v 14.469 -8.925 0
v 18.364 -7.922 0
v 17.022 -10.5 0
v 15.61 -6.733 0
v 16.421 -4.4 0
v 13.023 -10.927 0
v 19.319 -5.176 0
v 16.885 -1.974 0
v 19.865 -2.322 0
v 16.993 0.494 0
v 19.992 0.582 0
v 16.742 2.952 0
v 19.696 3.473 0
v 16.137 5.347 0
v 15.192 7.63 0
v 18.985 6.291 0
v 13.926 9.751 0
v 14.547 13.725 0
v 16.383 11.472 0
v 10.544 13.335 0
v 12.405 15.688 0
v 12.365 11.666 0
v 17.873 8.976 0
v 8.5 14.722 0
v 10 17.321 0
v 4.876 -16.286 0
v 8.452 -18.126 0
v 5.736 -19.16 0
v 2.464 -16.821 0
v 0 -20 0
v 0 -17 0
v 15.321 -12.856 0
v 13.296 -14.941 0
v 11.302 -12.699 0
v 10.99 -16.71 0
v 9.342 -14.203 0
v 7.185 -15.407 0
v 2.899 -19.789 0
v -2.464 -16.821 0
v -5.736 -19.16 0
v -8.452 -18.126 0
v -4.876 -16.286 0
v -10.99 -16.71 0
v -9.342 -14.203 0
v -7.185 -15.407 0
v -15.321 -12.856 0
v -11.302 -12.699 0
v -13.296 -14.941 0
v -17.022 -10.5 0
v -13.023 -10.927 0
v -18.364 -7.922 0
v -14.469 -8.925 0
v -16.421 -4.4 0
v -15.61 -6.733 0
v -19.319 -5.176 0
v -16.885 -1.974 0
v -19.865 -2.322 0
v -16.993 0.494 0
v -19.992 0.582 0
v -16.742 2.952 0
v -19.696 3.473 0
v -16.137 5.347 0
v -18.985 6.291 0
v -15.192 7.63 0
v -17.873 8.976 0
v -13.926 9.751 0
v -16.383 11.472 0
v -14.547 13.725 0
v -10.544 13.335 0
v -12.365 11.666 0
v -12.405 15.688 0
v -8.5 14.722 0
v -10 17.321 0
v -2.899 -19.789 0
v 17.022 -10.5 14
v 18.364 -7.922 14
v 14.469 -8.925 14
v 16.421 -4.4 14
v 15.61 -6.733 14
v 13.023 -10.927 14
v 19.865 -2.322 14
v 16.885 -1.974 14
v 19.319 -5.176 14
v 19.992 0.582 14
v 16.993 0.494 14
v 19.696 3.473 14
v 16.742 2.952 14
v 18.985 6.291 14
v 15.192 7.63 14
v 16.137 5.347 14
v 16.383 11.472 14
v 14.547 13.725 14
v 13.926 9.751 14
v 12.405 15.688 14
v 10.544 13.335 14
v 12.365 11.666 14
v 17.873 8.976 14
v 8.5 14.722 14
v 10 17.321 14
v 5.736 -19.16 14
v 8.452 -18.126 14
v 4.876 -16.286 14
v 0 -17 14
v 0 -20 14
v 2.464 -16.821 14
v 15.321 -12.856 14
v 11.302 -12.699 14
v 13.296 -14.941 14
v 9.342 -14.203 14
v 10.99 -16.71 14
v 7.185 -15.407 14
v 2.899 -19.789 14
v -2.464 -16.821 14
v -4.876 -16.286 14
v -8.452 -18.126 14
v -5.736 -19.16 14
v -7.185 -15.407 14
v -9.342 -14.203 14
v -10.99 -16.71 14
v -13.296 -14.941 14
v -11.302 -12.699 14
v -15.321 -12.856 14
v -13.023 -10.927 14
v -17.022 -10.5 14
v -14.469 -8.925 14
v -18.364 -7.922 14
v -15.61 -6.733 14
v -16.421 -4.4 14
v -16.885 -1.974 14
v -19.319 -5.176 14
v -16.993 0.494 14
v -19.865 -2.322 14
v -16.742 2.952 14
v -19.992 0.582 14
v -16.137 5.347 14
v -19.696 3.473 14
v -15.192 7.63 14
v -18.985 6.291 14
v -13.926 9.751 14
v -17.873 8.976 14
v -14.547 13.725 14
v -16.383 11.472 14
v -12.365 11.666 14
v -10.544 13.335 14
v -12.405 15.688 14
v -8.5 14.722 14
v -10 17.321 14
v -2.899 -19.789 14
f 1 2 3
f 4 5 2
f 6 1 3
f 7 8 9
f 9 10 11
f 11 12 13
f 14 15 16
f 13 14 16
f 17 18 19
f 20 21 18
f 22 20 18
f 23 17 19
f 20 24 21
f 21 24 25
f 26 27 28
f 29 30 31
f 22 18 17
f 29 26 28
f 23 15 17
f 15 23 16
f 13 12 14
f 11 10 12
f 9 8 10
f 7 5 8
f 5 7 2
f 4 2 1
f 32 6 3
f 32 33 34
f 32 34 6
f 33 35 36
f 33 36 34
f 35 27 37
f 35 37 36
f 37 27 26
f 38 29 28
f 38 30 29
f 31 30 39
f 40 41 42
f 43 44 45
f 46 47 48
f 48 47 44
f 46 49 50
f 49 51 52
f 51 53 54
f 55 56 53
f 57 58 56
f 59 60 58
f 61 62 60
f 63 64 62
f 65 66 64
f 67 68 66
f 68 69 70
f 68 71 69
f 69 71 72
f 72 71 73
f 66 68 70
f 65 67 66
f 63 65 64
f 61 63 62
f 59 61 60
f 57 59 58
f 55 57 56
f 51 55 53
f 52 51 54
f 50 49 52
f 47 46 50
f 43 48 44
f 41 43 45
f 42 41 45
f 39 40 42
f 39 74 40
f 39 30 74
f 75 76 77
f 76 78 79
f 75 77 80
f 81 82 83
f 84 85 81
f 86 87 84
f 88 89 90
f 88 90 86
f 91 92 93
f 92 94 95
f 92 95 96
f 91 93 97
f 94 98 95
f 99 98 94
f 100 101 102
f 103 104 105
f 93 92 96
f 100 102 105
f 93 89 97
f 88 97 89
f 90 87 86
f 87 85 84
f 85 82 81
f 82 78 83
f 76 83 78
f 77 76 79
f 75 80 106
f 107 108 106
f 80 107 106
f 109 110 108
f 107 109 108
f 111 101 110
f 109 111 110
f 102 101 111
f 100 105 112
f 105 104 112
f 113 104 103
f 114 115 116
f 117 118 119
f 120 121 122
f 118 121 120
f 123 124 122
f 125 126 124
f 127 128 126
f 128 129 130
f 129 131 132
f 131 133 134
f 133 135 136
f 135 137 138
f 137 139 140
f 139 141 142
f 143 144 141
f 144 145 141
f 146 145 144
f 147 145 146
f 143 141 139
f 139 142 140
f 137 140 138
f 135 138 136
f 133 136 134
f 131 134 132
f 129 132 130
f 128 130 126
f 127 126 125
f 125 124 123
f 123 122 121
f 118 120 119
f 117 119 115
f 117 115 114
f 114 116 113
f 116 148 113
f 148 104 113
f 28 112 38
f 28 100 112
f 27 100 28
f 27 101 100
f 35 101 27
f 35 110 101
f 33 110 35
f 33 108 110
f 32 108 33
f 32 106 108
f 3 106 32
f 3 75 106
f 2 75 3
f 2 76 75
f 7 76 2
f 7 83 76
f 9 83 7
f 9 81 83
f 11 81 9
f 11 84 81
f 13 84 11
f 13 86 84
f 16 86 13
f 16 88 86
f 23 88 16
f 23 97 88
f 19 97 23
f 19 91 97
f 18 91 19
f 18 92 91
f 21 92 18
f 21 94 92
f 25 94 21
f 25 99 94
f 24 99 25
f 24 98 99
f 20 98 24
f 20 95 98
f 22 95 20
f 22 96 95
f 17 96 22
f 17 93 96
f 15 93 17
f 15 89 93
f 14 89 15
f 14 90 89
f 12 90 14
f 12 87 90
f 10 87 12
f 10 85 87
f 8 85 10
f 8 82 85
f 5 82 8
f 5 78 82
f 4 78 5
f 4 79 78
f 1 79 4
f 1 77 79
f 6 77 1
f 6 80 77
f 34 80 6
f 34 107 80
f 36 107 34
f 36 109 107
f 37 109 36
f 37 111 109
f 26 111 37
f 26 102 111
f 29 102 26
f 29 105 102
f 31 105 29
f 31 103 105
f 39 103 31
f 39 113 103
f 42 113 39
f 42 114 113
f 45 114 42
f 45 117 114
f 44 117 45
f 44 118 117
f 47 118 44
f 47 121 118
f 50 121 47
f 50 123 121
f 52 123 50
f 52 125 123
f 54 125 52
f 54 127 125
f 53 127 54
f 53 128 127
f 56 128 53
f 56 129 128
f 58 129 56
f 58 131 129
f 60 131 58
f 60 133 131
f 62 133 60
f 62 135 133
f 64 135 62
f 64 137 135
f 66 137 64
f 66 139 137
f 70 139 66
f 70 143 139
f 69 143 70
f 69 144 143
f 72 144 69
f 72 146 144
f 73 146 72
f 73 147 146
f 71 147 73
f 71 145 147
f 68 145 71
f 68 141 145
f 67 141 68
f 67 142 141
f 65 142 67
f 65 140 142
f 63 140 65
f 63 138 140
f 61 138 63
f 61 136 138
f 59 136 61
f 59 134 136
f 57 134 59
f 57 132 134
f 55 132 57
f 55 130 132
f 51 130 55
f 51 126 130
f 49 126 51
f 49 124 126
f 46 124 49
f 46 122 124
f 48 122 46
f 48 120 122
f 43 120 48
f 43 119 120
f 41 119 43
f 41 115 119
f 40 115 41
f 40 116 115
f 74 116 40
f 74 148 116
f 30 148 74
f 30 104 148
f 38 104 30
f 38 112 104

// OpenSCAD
$fn = 32;

// ----------------------------------------------------------------------
// Spring clip: 40 mm outside, 3 mm band, 60 degree opening
// ----------------------------------------------------------------------

// --- parameters (mm) ---
outer_r = 20;             // clip outside radius
inner_r = 17;             // clip bore radius
band = 3;                 // band thickness
clip_w = 14;              // clip width
opening = 60;             // opening angle

clip_profile = [[-10, 17.321], [-12.405, 15.688], [-14.547, 13.725], [-16.383, 11.472], [-17.873, 8.976], [-18.985, 6.291], [-19.696, 3.473], [-19.992, 0.582], [-19.865, -2.322], [-19.319, -5.176], [-18.364, -7.922], [-17.022, -10.5], [-15.321, -12.856], [-13.296, -14.941], [-10.99, -16.71], [-8.452, -18.126], [-5.736, -19.16], [-2.899, -19.789], [0, -20], [2.899, -19.789], [5.736, -19.16], [8.452, -18.126], [10.99, -16.71], [13.296, -14.941], [15.321, -12.856], [17.022, -10.5], [18.364, -7.922], [19.319, -5.176], [19.865, -2.322], [19.992, 0.582], [19.696, 3.473], [18.985, 6.291], [17.873, 8.976], [16.383, 11.472], [14.547, 13.725], [12.405, 15.688], [10, 17.321], [8.5, 14.722], [10.544, 13.335], [12.365, 11.666], [13.926, 9.751], [15.192, 7.63], [16.137, 5.347], [16.742, 2.952], [16.993, 0.494], [16.885, -1.974], [16.421, -4.4], [15.61, -6.733], [14.469, -8.925], [13.023, -10.927], [11.302, -12.699], [9.342, -14.203], [7.185, -15.407], [4.876, -16.286], [2.464, -16.821], [0, -17], [-2.464, -16.821], [-4.876, -16.286], [-7.185, -15.407], [-9.342, -14.203], [-11.302, -12.699], [-13.023, -10.927], [-14.469, -8.925], [-15.61, -6.733], [-16.421, -4.4], [-16.885, -1.974], [-16.993, 0.494], [-16.742, 2.952], [-16.137, 5.347], [-15.192, 7.63], [-13.926, 9.751], [-12.365, 11.666], [-10.544, 13.335], [-8.5, 14.722]];

difference() {
  union() {
    linear_extrude(height = clip_w) polygon(clip_profile);
  }
}
